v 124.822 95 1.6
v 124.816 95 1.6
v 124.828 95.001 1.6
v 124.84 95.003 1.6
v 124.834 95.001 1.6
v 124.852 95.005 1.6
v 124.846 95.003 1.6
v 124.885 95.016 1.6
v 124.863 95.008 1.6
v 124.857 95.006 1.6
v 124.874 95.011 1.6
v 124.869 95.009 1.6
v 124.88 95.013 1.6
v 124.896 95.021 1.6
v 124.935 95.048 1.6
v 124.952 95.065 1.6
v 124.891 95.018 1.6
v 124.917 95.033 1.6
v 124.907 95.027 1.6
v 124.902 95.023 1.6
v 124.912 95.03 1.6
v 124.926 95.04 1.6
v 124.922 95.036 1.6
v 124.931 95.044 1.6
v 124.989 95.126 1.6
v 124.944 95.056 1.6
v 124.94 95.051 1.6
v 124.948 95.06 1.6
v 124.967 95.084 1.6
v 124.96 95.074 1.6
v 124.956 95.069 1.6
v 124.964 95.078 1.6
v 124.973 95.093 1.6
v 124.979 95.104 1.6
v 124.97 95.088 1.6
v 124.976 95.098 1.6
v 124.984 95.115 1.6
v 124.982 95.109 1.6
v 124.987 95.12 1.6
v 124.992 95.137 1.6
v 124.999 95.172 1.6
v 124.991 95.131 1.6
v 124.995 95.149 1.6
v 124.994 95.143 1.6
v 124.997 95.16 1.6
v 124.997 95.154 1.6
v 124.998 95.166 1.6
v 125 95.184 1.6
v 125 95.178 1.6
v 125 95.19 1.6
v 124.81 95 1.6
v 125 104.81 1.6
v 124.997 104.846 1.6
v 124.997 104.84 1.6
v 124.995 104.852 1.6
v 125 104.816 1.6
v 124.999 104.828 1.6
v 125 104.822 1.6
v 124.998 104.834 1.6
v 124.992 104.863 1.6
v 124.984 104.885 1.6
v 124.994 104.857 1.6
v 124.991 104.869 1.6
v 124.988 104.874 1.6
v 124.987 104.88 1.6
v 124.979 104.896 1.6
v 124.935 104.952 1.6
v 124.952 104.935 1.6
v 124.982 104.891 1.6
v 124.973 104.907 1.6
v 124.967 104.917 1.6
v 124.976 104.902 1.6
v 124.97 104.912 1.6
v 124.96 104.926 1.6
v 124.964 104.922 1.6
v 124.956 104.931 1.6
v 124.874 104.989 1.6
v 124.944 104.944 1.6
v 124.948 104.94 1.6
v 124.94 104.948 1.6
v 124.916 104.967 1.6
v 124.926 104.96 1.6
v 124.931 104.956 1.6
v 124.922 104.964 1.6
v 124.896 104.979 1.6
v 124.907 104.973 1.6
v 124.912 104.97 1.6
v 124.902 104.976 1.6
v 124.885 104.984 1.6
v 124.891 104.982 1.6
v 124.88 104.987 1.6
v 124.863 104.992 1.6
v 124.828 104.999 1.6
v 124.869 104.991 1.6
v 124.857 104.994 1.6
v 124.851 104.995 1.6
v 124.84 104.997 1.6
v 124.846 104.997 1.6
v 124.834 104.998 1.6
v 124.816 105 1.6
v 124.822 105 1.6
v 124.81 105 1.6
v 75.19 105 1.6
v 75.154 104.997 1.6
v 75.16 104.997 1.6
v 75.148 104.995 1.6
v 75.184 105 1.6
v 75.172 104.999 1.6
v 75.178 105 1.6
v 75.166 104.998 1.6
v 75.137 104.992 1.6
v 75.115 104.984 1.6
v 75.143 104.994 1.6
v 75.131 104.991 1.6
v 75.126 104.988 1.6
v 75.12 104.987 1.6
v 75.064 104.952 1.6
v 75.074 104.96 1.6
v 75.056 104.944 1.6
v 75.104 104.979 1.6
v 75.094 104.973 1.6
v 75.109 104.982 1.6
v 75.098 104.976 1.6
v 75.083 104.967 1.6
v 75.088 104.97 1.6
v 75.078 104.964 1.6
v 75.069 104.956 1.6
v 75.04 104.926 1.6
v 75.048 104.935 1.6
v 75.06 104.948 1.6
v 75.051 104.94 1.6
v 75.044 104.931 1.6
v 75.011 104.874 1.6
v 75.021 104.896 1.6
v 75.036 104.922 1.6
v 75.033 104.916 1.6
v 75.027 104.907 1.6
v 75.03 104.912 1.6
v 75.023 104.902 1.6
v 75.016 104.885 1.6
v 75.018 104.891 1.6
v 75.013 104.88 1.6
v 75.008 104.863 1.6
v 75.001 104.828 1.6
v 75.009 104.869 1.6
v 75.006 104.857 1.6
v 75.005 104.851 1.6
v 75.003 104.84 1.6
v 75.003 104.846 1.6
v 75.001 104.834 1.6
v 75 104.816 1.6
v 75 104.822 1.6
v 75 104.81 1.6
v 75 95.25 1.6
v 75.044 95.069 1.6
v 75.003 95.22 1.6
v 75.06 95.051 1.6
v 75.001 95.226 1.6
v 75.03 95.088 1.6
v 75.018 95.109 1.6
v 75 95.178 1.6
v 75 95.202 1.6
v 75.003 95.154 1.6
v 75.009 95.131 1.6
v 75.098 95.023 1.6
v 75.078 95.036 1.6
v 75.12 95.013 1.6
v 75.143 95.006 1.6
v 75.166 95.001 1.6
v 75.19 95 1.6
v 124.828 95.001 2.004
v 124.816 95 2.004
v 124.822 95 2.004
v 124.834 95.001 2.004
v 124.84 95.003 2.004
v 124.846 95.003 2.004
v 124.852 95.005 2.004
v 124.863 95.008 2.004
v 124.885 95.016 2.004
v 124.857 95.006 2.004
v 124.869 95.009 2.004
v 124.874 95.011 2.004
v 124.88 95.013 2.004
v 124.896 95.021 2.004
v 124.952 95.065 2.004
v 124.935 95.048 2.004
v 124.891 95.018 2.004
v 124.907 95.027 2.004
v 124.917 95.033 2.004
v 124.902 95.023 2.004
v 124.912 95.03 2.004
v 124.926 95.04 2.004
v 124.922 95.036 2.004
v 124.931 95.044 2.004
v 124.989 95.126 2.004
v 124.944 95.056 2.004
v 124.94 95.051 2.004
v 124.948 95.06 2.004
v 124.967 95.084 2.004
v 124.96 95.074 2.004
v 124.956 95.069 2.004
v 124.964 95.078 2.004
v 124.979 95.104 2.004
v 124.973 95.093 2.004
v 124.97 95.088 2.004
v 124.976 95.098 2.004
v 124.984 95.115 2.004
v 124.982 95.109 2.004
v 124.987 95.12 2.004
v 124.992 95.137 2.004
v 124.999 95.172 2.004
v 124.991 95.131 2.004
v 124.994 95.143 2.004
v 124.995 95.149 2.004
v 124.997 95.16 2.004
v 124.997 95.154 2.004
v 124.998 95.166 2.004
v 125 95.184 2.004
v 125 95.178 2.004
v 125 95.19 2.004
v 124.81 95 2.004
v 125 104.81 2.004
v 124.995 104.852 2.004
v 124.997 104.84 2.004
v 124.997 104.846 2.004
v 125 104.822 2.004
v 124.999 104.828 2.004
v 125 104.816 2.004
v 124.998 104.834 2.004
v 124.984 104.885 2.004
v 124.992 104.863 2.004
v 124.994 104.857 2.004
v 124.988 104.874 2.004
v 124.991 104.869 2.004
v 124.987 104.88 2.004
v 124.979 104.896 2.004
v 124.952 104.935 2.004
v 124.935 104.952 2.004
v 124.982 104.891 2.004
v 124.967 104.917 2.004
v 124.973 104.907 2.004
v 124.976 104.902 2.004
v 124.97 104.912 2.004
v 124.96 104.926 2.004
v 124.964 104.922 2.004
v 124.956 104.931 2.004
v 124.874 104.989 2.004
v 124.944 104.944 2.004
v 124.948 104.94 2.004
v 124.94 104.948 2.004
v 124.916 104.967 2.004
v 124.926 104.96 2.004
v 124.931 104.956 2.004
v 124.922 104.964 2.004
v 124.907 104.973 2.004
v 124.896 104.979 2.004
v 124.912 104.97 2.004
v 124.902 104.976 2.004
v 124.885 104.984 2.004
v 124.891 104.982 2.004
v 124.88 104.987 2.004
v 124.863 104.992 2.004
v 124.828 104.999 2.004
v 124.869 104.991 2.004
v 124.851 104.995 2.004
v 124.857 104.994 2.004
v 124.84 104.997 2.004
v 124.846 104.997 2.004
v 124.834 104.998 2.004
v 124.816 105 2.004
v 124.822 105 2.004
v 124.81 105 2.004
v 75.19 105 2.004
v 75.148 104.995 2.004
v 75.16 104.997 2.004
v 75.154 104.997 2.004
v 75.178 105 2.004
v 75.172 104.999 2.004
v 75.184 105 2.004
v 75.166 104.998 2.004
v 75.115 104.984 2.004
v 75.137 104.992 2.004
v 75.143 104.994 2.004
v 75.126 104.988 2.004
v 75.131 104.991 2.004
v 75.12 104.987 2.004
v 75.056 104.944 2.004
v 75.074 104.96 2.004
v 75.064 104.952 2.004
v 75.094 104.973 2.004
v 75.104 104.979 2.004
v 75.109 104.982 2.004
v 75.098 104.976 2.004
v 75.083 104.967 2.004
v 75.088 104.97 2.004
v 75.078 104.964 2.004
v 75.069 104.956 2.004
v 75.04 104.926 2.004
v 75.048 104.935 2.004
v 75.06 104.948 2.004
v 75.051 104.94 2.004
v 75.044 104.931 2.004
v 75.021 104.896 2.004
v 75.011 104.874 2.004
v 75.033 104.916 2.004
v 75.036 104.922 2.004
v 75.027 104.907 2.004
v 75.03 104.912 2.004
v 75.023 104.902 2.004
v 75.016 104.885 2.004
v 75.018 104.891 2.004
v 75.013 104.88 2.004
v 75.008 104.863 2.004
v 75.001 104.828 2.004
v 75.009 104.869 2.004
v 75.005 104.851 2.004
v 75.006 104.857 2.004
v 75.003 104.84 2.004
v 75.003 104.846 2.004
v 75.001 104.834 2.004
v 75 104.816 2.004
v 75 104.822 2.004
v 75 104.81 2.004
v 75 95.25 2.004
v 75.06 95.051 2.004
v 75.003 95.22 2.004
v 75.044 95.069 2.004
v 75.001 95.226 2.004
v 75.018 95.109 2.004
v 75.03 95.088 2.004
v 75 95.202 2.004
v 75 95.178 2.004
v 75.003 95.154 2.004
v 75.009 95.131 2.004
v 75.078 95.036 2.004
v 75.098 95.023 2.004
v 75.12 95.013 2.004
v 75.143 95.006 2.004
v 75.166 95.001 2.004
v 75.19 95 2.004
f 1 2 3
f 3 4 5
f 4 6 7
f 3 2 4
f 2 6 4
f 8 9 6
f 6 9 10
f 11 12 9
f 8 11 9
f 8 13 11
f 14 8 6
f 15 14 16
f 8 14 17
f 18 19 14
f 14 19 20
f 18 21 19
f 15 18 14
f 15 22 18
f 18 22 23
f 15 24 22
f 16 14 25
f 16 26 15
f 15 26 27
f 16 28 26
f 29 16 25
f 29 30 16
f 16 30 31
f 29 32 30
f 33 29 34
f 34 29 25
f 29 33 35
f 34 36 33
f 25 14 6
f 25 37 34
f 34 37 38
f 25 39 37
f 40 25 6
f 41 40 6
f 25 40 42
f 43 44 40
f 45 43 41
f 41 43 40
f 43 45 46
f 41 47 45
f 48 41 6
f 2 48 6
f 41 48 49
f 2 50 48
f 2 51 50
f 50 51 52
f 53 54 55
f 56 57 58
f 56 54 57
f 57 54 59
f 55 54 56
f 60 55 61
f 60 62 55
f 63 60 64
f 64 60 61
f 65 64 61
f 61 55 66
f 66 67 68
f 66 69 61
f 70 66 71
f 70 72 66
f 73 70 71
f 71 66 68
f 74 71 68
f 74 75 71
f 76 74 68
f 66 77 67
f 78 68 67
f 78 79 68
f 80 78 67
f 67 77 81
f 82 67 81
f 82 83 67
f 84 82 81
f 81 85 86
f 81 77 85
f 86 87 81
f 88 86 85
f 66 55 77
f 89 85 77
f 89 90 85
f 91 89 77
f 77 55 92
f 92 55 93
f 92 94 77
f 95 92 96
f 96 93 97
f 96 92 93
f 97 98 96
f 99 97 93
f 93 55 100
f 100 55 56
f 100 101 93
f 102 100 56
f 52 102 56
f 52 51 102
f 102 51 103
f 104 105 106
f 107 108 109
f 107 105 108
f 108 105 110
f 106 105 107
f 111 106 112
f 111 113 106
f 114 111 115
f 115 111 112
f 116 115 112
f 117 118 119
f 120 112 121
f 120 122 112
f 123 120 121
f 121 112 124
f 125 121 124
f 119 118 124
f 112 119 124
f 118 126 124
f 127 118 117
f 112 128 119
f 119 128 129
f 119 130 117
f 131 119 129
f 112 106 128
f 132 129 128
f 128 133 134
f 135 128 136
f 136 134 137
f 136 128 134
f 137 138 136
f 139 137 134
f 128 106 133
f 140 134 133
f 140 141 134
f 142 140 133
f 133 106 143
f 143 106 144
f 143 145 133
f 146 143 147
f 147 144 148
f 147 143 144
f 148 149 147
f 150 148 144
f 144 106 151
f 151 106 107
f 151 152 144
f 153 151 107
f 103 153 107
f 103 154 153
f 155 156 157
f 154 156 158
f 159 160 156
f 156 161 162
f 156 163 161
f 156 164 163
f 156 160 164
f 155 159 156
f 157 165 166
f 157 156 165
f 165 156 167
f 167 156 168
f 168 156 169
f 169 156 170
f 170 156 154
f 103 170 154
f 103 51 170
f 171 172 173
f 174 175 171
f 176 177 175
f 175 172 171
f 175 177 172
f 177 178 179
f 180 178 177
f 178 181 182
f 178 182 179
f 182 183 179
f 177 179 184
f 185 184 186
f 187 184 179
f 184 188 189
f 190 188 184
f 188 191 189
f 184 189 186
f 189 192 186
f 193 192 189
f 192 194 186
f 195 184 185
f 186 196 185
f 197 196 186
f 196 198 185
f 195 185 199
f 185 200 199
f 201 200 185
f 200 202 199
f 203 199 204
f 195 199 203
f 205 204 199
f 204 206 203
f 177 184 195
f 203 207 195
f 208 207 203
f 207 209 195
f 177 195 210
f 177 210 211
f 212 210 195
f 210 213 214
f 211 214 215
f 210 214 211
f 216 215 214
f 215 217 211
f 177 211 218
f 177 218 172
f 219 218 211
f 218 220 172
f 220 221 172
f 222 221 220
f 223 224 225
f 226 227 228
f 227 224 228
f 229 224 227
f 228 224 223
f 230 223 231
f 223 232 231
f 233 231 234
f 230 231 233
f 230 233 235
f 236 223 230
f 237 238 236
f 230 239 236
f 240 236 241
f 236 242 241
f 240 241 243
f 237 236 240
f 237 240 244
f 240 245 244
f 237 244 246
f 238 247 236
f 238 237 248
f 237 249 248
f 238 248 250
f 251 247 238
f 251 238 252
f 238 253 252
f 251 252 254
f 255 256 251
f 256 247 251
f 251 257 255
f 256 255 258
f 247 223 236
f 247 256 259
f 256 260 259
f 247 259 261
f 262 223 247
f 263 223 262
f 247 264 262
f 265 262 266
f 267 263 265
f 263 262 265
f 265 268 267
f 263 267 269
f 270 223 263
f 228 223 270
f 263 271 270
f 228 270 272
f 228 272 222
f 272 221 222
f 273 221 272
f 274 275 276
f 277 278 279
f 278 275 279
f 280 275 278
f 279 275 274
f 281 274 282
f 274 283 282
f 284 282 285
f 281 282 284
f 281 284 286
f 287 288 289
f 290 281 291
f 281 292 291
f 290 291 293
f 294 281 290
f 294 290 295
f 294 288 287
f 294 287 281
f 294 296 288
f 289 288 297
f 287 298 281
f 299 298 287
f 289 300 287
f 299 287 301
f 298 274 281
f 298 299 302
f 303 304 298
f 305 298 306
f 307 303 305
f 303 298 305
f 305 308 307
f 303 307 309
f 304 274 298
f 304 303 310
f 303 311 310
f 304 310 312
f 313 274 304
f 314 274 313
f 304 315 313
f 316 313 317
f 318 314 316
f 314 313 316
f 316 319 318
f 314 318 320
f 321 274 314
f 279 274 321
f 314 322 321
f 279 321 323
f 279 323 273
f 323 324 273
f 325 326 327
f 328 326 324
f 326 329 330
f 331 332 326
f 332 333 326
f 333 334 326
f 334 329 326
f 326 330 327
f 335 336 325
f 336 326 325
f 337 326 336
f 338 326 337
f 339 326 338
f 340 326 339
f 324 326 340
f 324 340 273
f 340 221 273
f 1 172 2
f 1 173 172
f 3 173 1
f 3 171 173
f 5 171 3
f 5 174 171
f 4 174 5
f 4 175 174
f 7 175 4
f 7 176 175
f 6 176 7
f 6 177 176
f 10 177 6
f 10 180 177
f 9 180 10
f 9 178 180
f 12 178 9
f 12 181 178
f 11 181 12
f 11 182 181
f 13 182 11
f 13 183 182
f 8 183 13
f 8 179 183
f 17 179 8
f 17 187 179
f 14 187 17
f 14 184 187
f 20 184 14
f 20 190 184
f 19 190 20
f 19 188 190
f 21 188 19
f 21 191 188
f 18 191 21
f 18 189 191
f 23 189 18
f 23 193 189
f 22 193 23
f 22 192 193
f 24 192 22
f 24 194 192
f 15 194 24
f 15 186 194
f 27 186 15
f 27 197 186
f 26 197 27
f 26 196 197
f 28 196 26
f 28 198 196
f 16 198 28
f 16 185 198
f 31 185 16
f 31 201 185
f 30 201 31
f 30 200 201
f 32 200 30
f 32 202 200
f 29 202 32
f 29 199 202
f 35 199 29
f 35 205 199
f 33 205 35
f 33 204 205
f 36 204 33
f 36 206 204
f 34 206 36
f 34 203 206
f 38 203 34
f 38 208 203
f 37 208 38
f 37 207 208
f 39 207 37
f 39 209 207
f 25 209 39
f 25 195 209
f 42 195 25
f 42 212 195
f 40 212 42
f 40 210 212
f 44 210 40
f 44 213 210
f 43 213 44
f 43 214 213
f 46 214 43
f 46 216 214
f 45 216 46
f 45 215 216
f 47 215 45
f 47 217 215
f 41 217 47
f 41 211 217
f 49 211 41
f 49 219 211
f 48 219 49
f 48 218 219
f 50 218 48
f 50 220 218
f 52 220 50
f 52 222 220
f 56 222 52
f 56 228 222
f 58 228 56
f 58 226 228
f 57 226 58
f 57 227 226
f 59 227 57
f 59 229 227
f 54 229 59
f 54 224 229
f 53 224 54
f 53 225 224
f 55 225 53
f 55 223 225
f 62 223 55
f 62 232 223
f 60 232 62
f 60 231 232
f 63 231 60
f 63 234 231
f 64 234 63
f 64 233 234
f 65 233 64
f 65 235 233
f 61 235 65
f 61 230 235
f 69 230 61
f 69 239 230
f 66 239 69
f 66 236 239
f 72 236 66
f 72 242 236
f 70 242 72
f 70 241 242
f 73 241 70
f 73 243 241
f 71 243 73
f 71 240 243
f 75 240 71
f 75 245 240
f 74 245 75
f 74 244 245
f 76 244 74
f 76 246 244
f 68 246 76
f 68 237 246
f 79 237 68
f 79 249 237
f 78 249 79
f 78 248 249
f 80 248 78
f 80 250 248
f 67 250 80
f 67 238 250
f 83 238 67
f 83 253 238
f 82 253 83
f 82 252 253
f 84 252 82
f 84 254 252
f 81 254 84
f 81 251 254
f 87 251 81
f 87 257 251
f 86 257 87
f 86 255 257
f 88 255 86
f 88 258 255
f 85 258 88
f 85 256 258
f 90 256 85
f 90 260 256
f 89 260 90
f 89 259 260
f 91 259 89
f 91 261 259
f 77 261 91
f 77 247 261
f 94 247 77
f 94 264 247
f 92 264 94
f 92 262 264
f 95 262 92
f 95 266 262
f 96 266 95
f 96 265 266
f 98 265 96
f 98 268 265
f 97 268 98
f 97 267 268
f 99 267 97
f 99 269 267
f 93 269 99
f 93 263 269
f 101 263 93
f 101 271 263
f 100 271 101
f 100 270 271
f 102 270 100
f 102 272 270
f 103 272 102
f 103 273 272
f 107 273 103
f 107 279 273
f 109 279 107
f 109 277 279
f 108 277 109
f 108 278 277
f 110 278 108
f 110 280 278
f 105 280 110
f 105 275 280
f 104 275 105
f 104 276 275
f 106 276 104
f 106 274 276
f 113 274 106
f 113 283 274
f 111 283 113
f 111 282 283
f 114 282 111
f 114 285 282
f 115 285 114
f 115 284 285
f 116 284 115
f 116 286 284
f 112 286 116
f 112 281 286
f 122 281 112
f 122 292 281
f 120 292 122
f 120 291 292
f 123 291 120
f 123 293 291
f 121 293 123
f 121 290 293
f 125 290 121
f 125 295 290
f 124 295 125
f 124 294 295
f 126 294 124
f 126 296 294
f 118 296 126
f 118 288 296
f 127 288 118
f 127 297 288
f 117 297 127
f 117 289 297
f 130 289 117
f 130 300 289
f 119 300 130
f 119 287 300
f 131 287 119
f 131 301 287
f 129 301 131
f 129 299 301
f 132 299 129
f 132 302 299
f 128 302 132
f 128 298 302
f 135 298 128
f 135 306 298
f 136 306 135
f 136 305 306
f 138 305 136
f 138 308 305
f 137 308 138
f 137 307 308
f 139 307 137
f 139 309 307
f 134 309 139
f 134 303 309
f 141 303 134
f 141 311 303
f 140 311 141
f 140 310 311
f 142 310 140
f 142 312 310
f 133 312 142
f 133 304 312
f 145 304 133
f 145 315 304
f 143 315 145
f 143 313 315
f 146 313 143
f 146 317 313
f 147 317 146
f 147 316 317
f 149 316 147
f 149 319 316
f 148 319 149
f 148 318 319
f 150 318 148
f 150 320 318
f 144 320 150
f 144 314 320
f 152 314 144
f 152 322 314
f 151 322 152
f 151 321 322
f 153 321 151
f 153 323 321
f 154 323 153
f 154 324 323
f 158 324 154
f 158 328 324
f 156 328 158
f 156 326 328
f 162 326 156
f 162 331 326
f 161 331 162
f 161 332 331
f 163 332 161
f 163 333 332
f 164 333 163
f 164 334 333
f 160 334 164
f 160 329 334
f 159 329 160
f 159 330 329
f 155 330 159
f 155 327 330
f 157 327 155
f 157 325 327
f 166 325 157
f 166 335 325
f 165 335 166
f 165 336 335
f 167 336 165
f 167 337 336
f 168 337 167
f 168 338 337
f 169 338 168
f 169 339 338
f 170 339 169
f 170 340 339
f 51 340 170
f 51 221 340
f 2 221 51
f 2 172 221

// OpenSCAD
module drawBasicShape(x1, y1, x2, y2, width)
{
	length = sqrt((x1-x2)*(x1-x2) + (y1-y2)*(y1-y2));
	if (width!=0.0) {
		square(size = [width, length], center = false);
		translate([width/2.0, 0, 0]) circle(d=width);
		translate([width/2.0, length, 0]) circle(d=width);
	}
}

module translateAndRotate(x1, y1, x2, y2, width)
{
	if (width != 0.0) {
		angle = atan((y2-y1)/(x2-x1)) +270;
		if (x2>=x1) {
			translate([x1, y1, 0.0]) rotate([0.0, 0.0, angle]) translate([-width/2.0, 0.0, 0.0]) scale([1.0, 1.0, 1.0]) drawBasicShape(x1, y1, x2, y2, width);
		}
		else {
			translate([x1, y1, 0.0]) rotate([0.0, 0.0, angle+180]) translate([-width/2.0, 0.0, 0.0]) scale([1.0, 1.0, 1.0]) drawBasicShape(x1, y1, x2, y2, width);		}
	}
}

$fn=50;

points3 = [
[75.77800000, 95.77800000, 0.00000000],
[124.22200000, 95.77800000, 0.37999672],
[124.22200000, 104.22200000, 0.37997788],
[75.77800000, 104.22200000, 0.37999548],
[75.77800000, 95.83800000, 0.37998140],
[75.48400000, 95.48400000, 0.00000000],
[124.51600000, 95.48400000, 0.37999746],
[124.51600000, 104.51600000, 0.37998977],
[75.48400000, 104.51600000, 0.37999868],
[75.48400000, 95.54400000, 0.37998644],
[75.19000000, 95.19000000, 0.00000000],
[124.81000000, 95.19000000, 0.38000060],
[124.81000000, 104.81000000, 0.38000021],
[75.19000000, 104.81000000, 0.37999939],
[75.19000000, 95.25000000, 0.38000344],
[75.53600000, 95.39000000, 0.00000000],
[76.11100000, 95.94600000, 0.00000000],
[75.94600000, 96.11100000, 0.37961375],
[75.94600000, 96.52800000, 0.38001190],
[76.52800000, 95.94600000, 0.37989934],
[76.94500000, 95.94600000, 0.38001190],
[75.94600000, 96.94500000, 0.37998907],
[75.94600000, 97.36200000, 0.38001190],
[77.36200000, 95.94600000, 0.37999592],
[77.77900000, 95.94600000, 0.38001190],
[75.94600000, 97.77900000, 0.37999966],
[75.94600000, 98.19600000, 0.38001190],
[78.19600000, 95.94600000, 0.38000201],
[78.61300000, 95.94600000, 0.38015610],
[75.94600000, 98.61300000, 0.38000362],
[75.94600000, 99.03000000, 0.38015610],
[79.03000000, 95.94600000, 0.38001859],
[79.44700000, 95.94600000, 0.38001190],
[75.94600000, 99.44700000, 0.38001785],
[75.94600000, 99.86400000, 0.38015610],
[79.86400000, 95.94600000, 0.38001726],
[80.28100000, 95.94600000, 0.38015610],
[75.94600000, 100.28100000, 0.38002660],
[75.94600000, 100.69800000, 0.38001190],
[80.69800000, 95.94600000, 0.38002534],
[81.11500000, 95.94600000, 0.38001190],
[75.94600000, 101.11500000, 0.38003252],
[75.94600000, 101.53300000, 0.37930814],
[81.53300000, 95.94600000, 0.37997836],
[81.95000000, 95.94600000, 0.38015610],
[75.94600000, 101.95000000, 0.37998072],
[75.94600000, 102.36700000, 0.38001190],
[82.36700000, 95.94600000, 0.37998939],
[82.78400000, 95.94600000, 0.38001190],
[75.94600000, 102.78400000, 0.37999079],
[75.94600000, 103.20100000, 0.38001190],
[83.20100000, 95.94600000, 0.37999789],
[83.61800000, 95.94600000, 0.38001190],
[75.94600000, 103.61800000, 0.37999868],
[75.95600000, 104.02400000, 0.38033920],
[84.03500000, 95.94600000, 0.38000275],
[84.45200000, 95.94600000, 0.38001190],
[76.34400000, 104.05400000, 0.38000754],
[76.76100000, 104.05400000, 0.38001190],
[84.86900000, 95.94600000, 0.38000229],
[85.28600000, 95.94600000, 0.38015610],
[77.17800000, 104.05400000, 0.38000229],
[77.59500000, 104.05400000, 0.38001190],
[85.70300000, 95.94600000, 0.38000754],
[86.12000000, 95.94600000, 0.38001190],
[78.01200000, 104.05400000, 0.38000229],
[78.42900000, 104.05400000, 0.38001190],
[86.53700000, 95.94600000, 0.38000754],
[86.95400000, 95.94600000, 0.38001190],
[78.84600000, 104.05400000, 0.38000229],
[79.26300000, 104.05400000, 0.38015610],
[87.37100000, 95.94600000, 0.38000229],
[87.78900000, 95.94600000, 0.37930814],
[79.68000000, 104.05400000, 0.37998940],
[80.09700000, 104.05400000, 0.38001190],
[88.20600000, 95.94600000, 0.37998415],
[88.62300000, 95.94600000, 0.38001190],
[80.51500000, 104.05400000, 0.38000754],
[80.93200000, 104.05400000, 0.38001190],
[89.04000000, 95.94600000, 0.38000229],
[89.45700000, 95.94600000, 0.38015610],
[81.34900000, 104.05400000, 0.38000229],
[81.76600000, 104.05400000, 0.38001190],
[89.87400000, 95.94600000, 0.38000229],
[90.29100000, 95.94600000, 0.38015610],
[82.18300000, 104.05400000, 0.38000229],
[82.60000000, 104.05400000, 0.38001190],
[90.70800000, 95.94600000, 0.38000754],
[91.12500000, 95.94600000, 0.38001190],
[83.01700000, 104.05400000, 0.38000229],
[83.43400000, 104.05400000, 0.38015610],
[91.54200000, 95.94600000, 0.38000229],
[91.95900000, 95.94600000, 0.38001190],
[83.85100000, 104.05400000, 0.38000229],
[84.26800000, 104.05400000, 0.38015610],
[92.37600000, 95.94600000, 0.38000229],
[92.79300000, 95.94600000, 0.38001190],
[84.68500000, 104.05400000, 0.38000754],
[85.10200000, 104.05400000, 0.38001190],
[93.21000000, 95.94600000, 0.38000229],
[93.62700000, 95.94600000, 0.38001190],
[85.51900000, 104.05400000, 0.38000754],
[85.93600000, 104.05400000, 0.38001190],
[94.04400000, 95.94600000, 0.38000229],
[94.46200000, 95.94600000, 0.37945200],
[86.35300000, 104.05400000, 0.37998415],
[86.77000000, 104.05400000, 0.38001190],
[94.87900000, 95.94600000, 0.37998940],
[95.29600000, 95.94600000, 0.38001190],
[87.18800000, 104.05400000, 0.38000229],
[87.60500000, 104.05400000, 0.38001190],
[95.71300000, 95.94600000, 0.38000754],
[96.13000000, 95.94600000, 0.38001190],
[88.02200000, 104.05400000, 0.38000229],
[88.43900000, 104.05400000, 0.38015610],
[96.54700000, 95.94600000, 0.38000229],
[96.96400000, 95.94600000, 0.38001190],
[88.85600000, 104.05400000, 0.38000754],
[89.27300000, 104.05400000, 0.38001190],
[97.38100000, 95.94600000, 0.38000229],
[97.79800000, 95.94600000, 0.38001190],
[89.69000000, 104.05400000, 0.38000754],
[90.10700000, 104.05400000, 0.38001190],
[98.21500000, 95.94600000, 0.38000229],
[98.63200000, 95.94600000, 0.38015610],
[90.52400000, 104.05400000, 0.38000229],
[90.94100000, 104.05400000, 0.38001190],
[99.04900000, 95.94600000, 0.38000754],
[99.46600000, 95.94600000, 0.38001190],
[91.35800000, 104.05400000, 0.38000229],
[91.77500000, 104.05400000, 0.38001190],
[99.88300000, 95.94600000, 0.38000754],
[100.30000000, 95.94600000, 0.38001190],
[92.19200000, 104.05400000, 0.38000229],
[92.60900000, 104.05400000, 0.38015610],
[100.71800000, 95.94600000, 0.37998415],
[101.13500000, 95.94600000, 0.38001190],
[93.02600000, 104.05400000, 0.37998940],
[93.44400000, 104.05400000, 0.37930814],
[101.55200000, 95.94600000, 0.38000229],
[101.96900000, 95.94600000, 0.38001190],
[93.86100000, 104.05400000, 0.38000754],
[94.27800000, 104.05400000, 0.38001190],
[102.38600000, 95.94600000, 0.38000229],
[102.80300000, 95.94600000, 0.38015610],
[94.69500000, 104.05400000, 0.38000229],
[95.11200000, 104.05400000, 0.38001190],
[103.22000000, 95.94600000, 0.38000754],
[103.63700000, 95.94600000, 0.38001190],
[95.52900000, 104.05400000, 0.38000229],
[95.94600000, 104.05400000, 0.38001190],
[104.05400000, 95.94600000, 0.38000754],
[104.47100000, 95.94600000, 0.38001190],
[96.36300000, 104.05400000, 0.38000229],
[96.78000000, 104.05400000, 0.38015610],
[104.88800000, 95.94600000, 0.38000229],
[105.30500000, 95.94600000, 0.38001190],
[97.19700000, 104.05400000, 0.38000754],
[97.61400000, 104.05400000, 0.38001190],
[105.72200000, 95.94600000, 0.38000229],
[106.13900000, 95.94600000, 0.38001190],
[98.03100000, 104.05400000, 0.38000754],
[98.44800000, 104.05400000, 0.38001190],
[106.55600000, 95.94600000, 0.38000229],
[106.97300000, 95.94600000, 0.38015610],
[98.86500000, 104.05400000, 0.38000229],
[99.28200000, 104.05400000, 0.38001190],
[107.39100000, 95.94600000, 0.37998940],
[107.80800000, 95.94600000, 0.38001190],
[99.69900000, 104.05400000, 0.37998415],
[100.11700000, 104.05400000, 0.37930814],
[108.22500000, 95.94600000, 0.38000754],
[108.64200000, 95.94600000, 0.38001190],
[100.53400000, 104.05400000, 0.38000229],
[100.95100000, 104.05400000, 0.38015610],
[109.05900000, 95.94600000, 0.38000229],
[109.47600000, 95.94600000, 0.38001190],
[101.36800000, 104.05400000, 0.38000754],
[101.78500000, 104.05400000, 0.38001190],
[109.89300000, 95.94600000, 0.38000229],
[110.31000000, 95.94600000, 0.38001190],
[102.20200000, 104.05400000, 0.38000754],
[102.61900000, 104.05400000, 0.38001190],
[110.72700000, 95.94600000, 0.38000229],
[111.14400000, 95.94600000, 0.38015610],
[103.03600000, 104.05400000, 0.38000229],
[103.45300000, 104.05400000, 0.38001190],
[111.56100000, 95.94600000, 0.38000754],
[111.97800000, 95.94600000, 0.38001190],
[103.87000000, 104.05400000, 0.38000229],
[104.28700000, 104.05400000, 0.38001190],
[112.39500000, 95.94600000, 0.38000754],
[112.81200000, 95.94600000, 0.38001190],
[104.70400000, 104.05400000, 0.38000229],
[105.12100000, 104.05400000, 0.38015610],
[113.22900000, 95.94600000, 0.38000229],
[113.64700000, 95.94600000, 0.37930814],
[105.53800000, 104.05400000, 0.37998940],
[105.95500000, 104.05400000, 0.38001190],
[114.06400000, 95.94600000, 0.37998415],
[114.48100000, 95.94600000, 0.38001190],
[106.37300000, 104.05400000, 0.38000754],
[106.79000000, 104.05400000, 0.38001190],
[114.89800000, 95.94600000, 0.38000229],
[115.31500000, 95.94600000, 0.38015610],
[107.20700000, 104.05400000, 0.38000229],
[107.62400000, 104.05400000, 0.38001190],
[115.73200000, 95.94600000, 0.38000754],
[116.14900000, 95.94600000, 0.38001190],
[108.04100000, 104.05400000, 0.38000229],
[108.45800000, 104.05400000, 0.38001190],
[116.56600000, 95.94600000, 0.38000754],
[116.98300000, 95.94600000, 0.38001190],
[108.87500000, 104.05400000, 0.38000229],
[109.29200000, 104.05400000, 0.38015610],
[117.40000000, 95.94600000, 0.38000229],
[117.81700000, 95.94600000, 0.38001190],
[109.70900000, 104.05400000, 0.38000754],
[110.12600000, 104.05400000, 0.38001190],
[118.23400000, 95.94600000, 0.38000229],
[118.65100000, 95.94600000, 0.38001190],
[110.54300000, 104.05400000, 0.38000754],
[110.96000000, 104.05400000, 0.38001190],
[119.06800000, 95.94600000, 0.38000229],
[119.48500000, 95.94600000, 0.38015610],
[111.37700000, 104.05400000, 0.38000229],
[111.79400000, 104.05400000, 0.38001190],
[119.90200000, 95.94600000, 0.38000754],
[120.32000000, 95.94600000, 0.37930814],
[112.21100000, 104.05400000, 0.37998415],
[112.62900000, 104.05400000, 0.37930814],
[120.73700000, 95.94600000, 0.38000754],
[121.15400000, 95.94600000, 0.38001190],
[113.04600000, 104.05400000, 0.38000229],
[113.46300000, 104.05400000, 0.38015610],
[121.57100000, 95.94600000, 0.38000229],
[121.98800000, 95.94600000, 0.38001190],
[113.88000000, 104.05400000, 0.38000754],
[114.29700000, 104.05400000, 0.38001190],
[122.40500000, 95.94600000, 0.38000229],
[122.82200000, 95.94600000, 0.38001190],
[114.71400000, 104.05400000, 0.38000754],
[115.13100000, 104.05400000, 0.38001190],
[123.23900000, 95.94600000, 0.38000229],
[123.65600000, 95.94600000, 0.38015610],
[115.54800000, 104.05400000, 0.38000229],
[115.96500000, 104.05400000, 0.38001190],
[124.04400000, 95.97500000, 0.37998455],
[124.05400000, 96.38200000, 0.37976376],
[116.38200000, 104.05400000, 0.37999868],
[116.79900000, 104.05400000, 0.38001190],
[124.05400000, 96.79900000, 0.37999789],
[124.05400000, 97.21600000, 0.38001190],
[117.21600000, 104.05400000, 0.37999079],
[117.63300000, 104.05400000, 0.38015610],
[124.05400000, 97.63300000, 0.37998939],
[124.05400000, 98.05000000, 0.38001190],
[118.05000000, 104.05400000, 0.37998780],
[118.46700000, 104.05400000, 0.38001190],
[124.05400000, 98.46700000, 0.37997836],
[124.05400000, 98.88400000, 0.38001190],
[118.88400000, 104.05400000, 0.37997562],
[119.30200000, 104.05400000, 0.37945200],
[124.05400000, 99.30200000, 0.38002534],
[124.05400000, 99.71900000, 0.38015610],
[119.71900000, 104.05400000, 0.38002660],
[120.13600000, 104.05400000, 0.38001190],
[124.05400000, 100.13600000, 0.38002811],
[124.05400000, 100.55300000, 0.38015610],
[120.55300000, 104.05400000, 0.38001785],
[120.97000000, 104.05400000, 0.38015610],
[124.05400000, 100.97000000, 0.38001859],
[124.05400000, 101.38700000, 0.38001190],
[121.38700000, 104.05400000, 0.38001957],
[121.80400000, 104.05400000, 0.38015610],
[124.05400000, 101.80400000, 0.38000201],
[124.05400000, 102.22100000, 0.38015610],
[122.22100000, 104.05400000, 0.37999966],
[122.63800000, 104.05400000, 0.38001190],
[124.05400000, 102.63800000, 0.37999592],
[124.05400000, 103.05500000, 0.38015610],
[123.05500000, 104.05400000, 0.37994651],
[123.47200000, 104.05400000, 0.38015610],
[124.05400000, 103.47200000, 0.37989934],
[124.05400000, 103.88900000, 0.38001190],
[123.88900000, 104.05400000, 0.37961375],
];

translate([0.0, 0.0, 1.60000000]) {
	linear_extrude(height = 0.40400000, center = false, convexity = 10, twist = 0) {
		union() {
			for( i=[0:len(points3)-2] ){ 
				x1 = points3[i][0];
				y1 = points3[i][1];
				x2 = points3[i+1][0];
				y2 = points3[i+1][1];
				width = points3[i+1][2];
				translateAndRotate(x1, y1, x2, y2, width);
			}
		}
	}
}
